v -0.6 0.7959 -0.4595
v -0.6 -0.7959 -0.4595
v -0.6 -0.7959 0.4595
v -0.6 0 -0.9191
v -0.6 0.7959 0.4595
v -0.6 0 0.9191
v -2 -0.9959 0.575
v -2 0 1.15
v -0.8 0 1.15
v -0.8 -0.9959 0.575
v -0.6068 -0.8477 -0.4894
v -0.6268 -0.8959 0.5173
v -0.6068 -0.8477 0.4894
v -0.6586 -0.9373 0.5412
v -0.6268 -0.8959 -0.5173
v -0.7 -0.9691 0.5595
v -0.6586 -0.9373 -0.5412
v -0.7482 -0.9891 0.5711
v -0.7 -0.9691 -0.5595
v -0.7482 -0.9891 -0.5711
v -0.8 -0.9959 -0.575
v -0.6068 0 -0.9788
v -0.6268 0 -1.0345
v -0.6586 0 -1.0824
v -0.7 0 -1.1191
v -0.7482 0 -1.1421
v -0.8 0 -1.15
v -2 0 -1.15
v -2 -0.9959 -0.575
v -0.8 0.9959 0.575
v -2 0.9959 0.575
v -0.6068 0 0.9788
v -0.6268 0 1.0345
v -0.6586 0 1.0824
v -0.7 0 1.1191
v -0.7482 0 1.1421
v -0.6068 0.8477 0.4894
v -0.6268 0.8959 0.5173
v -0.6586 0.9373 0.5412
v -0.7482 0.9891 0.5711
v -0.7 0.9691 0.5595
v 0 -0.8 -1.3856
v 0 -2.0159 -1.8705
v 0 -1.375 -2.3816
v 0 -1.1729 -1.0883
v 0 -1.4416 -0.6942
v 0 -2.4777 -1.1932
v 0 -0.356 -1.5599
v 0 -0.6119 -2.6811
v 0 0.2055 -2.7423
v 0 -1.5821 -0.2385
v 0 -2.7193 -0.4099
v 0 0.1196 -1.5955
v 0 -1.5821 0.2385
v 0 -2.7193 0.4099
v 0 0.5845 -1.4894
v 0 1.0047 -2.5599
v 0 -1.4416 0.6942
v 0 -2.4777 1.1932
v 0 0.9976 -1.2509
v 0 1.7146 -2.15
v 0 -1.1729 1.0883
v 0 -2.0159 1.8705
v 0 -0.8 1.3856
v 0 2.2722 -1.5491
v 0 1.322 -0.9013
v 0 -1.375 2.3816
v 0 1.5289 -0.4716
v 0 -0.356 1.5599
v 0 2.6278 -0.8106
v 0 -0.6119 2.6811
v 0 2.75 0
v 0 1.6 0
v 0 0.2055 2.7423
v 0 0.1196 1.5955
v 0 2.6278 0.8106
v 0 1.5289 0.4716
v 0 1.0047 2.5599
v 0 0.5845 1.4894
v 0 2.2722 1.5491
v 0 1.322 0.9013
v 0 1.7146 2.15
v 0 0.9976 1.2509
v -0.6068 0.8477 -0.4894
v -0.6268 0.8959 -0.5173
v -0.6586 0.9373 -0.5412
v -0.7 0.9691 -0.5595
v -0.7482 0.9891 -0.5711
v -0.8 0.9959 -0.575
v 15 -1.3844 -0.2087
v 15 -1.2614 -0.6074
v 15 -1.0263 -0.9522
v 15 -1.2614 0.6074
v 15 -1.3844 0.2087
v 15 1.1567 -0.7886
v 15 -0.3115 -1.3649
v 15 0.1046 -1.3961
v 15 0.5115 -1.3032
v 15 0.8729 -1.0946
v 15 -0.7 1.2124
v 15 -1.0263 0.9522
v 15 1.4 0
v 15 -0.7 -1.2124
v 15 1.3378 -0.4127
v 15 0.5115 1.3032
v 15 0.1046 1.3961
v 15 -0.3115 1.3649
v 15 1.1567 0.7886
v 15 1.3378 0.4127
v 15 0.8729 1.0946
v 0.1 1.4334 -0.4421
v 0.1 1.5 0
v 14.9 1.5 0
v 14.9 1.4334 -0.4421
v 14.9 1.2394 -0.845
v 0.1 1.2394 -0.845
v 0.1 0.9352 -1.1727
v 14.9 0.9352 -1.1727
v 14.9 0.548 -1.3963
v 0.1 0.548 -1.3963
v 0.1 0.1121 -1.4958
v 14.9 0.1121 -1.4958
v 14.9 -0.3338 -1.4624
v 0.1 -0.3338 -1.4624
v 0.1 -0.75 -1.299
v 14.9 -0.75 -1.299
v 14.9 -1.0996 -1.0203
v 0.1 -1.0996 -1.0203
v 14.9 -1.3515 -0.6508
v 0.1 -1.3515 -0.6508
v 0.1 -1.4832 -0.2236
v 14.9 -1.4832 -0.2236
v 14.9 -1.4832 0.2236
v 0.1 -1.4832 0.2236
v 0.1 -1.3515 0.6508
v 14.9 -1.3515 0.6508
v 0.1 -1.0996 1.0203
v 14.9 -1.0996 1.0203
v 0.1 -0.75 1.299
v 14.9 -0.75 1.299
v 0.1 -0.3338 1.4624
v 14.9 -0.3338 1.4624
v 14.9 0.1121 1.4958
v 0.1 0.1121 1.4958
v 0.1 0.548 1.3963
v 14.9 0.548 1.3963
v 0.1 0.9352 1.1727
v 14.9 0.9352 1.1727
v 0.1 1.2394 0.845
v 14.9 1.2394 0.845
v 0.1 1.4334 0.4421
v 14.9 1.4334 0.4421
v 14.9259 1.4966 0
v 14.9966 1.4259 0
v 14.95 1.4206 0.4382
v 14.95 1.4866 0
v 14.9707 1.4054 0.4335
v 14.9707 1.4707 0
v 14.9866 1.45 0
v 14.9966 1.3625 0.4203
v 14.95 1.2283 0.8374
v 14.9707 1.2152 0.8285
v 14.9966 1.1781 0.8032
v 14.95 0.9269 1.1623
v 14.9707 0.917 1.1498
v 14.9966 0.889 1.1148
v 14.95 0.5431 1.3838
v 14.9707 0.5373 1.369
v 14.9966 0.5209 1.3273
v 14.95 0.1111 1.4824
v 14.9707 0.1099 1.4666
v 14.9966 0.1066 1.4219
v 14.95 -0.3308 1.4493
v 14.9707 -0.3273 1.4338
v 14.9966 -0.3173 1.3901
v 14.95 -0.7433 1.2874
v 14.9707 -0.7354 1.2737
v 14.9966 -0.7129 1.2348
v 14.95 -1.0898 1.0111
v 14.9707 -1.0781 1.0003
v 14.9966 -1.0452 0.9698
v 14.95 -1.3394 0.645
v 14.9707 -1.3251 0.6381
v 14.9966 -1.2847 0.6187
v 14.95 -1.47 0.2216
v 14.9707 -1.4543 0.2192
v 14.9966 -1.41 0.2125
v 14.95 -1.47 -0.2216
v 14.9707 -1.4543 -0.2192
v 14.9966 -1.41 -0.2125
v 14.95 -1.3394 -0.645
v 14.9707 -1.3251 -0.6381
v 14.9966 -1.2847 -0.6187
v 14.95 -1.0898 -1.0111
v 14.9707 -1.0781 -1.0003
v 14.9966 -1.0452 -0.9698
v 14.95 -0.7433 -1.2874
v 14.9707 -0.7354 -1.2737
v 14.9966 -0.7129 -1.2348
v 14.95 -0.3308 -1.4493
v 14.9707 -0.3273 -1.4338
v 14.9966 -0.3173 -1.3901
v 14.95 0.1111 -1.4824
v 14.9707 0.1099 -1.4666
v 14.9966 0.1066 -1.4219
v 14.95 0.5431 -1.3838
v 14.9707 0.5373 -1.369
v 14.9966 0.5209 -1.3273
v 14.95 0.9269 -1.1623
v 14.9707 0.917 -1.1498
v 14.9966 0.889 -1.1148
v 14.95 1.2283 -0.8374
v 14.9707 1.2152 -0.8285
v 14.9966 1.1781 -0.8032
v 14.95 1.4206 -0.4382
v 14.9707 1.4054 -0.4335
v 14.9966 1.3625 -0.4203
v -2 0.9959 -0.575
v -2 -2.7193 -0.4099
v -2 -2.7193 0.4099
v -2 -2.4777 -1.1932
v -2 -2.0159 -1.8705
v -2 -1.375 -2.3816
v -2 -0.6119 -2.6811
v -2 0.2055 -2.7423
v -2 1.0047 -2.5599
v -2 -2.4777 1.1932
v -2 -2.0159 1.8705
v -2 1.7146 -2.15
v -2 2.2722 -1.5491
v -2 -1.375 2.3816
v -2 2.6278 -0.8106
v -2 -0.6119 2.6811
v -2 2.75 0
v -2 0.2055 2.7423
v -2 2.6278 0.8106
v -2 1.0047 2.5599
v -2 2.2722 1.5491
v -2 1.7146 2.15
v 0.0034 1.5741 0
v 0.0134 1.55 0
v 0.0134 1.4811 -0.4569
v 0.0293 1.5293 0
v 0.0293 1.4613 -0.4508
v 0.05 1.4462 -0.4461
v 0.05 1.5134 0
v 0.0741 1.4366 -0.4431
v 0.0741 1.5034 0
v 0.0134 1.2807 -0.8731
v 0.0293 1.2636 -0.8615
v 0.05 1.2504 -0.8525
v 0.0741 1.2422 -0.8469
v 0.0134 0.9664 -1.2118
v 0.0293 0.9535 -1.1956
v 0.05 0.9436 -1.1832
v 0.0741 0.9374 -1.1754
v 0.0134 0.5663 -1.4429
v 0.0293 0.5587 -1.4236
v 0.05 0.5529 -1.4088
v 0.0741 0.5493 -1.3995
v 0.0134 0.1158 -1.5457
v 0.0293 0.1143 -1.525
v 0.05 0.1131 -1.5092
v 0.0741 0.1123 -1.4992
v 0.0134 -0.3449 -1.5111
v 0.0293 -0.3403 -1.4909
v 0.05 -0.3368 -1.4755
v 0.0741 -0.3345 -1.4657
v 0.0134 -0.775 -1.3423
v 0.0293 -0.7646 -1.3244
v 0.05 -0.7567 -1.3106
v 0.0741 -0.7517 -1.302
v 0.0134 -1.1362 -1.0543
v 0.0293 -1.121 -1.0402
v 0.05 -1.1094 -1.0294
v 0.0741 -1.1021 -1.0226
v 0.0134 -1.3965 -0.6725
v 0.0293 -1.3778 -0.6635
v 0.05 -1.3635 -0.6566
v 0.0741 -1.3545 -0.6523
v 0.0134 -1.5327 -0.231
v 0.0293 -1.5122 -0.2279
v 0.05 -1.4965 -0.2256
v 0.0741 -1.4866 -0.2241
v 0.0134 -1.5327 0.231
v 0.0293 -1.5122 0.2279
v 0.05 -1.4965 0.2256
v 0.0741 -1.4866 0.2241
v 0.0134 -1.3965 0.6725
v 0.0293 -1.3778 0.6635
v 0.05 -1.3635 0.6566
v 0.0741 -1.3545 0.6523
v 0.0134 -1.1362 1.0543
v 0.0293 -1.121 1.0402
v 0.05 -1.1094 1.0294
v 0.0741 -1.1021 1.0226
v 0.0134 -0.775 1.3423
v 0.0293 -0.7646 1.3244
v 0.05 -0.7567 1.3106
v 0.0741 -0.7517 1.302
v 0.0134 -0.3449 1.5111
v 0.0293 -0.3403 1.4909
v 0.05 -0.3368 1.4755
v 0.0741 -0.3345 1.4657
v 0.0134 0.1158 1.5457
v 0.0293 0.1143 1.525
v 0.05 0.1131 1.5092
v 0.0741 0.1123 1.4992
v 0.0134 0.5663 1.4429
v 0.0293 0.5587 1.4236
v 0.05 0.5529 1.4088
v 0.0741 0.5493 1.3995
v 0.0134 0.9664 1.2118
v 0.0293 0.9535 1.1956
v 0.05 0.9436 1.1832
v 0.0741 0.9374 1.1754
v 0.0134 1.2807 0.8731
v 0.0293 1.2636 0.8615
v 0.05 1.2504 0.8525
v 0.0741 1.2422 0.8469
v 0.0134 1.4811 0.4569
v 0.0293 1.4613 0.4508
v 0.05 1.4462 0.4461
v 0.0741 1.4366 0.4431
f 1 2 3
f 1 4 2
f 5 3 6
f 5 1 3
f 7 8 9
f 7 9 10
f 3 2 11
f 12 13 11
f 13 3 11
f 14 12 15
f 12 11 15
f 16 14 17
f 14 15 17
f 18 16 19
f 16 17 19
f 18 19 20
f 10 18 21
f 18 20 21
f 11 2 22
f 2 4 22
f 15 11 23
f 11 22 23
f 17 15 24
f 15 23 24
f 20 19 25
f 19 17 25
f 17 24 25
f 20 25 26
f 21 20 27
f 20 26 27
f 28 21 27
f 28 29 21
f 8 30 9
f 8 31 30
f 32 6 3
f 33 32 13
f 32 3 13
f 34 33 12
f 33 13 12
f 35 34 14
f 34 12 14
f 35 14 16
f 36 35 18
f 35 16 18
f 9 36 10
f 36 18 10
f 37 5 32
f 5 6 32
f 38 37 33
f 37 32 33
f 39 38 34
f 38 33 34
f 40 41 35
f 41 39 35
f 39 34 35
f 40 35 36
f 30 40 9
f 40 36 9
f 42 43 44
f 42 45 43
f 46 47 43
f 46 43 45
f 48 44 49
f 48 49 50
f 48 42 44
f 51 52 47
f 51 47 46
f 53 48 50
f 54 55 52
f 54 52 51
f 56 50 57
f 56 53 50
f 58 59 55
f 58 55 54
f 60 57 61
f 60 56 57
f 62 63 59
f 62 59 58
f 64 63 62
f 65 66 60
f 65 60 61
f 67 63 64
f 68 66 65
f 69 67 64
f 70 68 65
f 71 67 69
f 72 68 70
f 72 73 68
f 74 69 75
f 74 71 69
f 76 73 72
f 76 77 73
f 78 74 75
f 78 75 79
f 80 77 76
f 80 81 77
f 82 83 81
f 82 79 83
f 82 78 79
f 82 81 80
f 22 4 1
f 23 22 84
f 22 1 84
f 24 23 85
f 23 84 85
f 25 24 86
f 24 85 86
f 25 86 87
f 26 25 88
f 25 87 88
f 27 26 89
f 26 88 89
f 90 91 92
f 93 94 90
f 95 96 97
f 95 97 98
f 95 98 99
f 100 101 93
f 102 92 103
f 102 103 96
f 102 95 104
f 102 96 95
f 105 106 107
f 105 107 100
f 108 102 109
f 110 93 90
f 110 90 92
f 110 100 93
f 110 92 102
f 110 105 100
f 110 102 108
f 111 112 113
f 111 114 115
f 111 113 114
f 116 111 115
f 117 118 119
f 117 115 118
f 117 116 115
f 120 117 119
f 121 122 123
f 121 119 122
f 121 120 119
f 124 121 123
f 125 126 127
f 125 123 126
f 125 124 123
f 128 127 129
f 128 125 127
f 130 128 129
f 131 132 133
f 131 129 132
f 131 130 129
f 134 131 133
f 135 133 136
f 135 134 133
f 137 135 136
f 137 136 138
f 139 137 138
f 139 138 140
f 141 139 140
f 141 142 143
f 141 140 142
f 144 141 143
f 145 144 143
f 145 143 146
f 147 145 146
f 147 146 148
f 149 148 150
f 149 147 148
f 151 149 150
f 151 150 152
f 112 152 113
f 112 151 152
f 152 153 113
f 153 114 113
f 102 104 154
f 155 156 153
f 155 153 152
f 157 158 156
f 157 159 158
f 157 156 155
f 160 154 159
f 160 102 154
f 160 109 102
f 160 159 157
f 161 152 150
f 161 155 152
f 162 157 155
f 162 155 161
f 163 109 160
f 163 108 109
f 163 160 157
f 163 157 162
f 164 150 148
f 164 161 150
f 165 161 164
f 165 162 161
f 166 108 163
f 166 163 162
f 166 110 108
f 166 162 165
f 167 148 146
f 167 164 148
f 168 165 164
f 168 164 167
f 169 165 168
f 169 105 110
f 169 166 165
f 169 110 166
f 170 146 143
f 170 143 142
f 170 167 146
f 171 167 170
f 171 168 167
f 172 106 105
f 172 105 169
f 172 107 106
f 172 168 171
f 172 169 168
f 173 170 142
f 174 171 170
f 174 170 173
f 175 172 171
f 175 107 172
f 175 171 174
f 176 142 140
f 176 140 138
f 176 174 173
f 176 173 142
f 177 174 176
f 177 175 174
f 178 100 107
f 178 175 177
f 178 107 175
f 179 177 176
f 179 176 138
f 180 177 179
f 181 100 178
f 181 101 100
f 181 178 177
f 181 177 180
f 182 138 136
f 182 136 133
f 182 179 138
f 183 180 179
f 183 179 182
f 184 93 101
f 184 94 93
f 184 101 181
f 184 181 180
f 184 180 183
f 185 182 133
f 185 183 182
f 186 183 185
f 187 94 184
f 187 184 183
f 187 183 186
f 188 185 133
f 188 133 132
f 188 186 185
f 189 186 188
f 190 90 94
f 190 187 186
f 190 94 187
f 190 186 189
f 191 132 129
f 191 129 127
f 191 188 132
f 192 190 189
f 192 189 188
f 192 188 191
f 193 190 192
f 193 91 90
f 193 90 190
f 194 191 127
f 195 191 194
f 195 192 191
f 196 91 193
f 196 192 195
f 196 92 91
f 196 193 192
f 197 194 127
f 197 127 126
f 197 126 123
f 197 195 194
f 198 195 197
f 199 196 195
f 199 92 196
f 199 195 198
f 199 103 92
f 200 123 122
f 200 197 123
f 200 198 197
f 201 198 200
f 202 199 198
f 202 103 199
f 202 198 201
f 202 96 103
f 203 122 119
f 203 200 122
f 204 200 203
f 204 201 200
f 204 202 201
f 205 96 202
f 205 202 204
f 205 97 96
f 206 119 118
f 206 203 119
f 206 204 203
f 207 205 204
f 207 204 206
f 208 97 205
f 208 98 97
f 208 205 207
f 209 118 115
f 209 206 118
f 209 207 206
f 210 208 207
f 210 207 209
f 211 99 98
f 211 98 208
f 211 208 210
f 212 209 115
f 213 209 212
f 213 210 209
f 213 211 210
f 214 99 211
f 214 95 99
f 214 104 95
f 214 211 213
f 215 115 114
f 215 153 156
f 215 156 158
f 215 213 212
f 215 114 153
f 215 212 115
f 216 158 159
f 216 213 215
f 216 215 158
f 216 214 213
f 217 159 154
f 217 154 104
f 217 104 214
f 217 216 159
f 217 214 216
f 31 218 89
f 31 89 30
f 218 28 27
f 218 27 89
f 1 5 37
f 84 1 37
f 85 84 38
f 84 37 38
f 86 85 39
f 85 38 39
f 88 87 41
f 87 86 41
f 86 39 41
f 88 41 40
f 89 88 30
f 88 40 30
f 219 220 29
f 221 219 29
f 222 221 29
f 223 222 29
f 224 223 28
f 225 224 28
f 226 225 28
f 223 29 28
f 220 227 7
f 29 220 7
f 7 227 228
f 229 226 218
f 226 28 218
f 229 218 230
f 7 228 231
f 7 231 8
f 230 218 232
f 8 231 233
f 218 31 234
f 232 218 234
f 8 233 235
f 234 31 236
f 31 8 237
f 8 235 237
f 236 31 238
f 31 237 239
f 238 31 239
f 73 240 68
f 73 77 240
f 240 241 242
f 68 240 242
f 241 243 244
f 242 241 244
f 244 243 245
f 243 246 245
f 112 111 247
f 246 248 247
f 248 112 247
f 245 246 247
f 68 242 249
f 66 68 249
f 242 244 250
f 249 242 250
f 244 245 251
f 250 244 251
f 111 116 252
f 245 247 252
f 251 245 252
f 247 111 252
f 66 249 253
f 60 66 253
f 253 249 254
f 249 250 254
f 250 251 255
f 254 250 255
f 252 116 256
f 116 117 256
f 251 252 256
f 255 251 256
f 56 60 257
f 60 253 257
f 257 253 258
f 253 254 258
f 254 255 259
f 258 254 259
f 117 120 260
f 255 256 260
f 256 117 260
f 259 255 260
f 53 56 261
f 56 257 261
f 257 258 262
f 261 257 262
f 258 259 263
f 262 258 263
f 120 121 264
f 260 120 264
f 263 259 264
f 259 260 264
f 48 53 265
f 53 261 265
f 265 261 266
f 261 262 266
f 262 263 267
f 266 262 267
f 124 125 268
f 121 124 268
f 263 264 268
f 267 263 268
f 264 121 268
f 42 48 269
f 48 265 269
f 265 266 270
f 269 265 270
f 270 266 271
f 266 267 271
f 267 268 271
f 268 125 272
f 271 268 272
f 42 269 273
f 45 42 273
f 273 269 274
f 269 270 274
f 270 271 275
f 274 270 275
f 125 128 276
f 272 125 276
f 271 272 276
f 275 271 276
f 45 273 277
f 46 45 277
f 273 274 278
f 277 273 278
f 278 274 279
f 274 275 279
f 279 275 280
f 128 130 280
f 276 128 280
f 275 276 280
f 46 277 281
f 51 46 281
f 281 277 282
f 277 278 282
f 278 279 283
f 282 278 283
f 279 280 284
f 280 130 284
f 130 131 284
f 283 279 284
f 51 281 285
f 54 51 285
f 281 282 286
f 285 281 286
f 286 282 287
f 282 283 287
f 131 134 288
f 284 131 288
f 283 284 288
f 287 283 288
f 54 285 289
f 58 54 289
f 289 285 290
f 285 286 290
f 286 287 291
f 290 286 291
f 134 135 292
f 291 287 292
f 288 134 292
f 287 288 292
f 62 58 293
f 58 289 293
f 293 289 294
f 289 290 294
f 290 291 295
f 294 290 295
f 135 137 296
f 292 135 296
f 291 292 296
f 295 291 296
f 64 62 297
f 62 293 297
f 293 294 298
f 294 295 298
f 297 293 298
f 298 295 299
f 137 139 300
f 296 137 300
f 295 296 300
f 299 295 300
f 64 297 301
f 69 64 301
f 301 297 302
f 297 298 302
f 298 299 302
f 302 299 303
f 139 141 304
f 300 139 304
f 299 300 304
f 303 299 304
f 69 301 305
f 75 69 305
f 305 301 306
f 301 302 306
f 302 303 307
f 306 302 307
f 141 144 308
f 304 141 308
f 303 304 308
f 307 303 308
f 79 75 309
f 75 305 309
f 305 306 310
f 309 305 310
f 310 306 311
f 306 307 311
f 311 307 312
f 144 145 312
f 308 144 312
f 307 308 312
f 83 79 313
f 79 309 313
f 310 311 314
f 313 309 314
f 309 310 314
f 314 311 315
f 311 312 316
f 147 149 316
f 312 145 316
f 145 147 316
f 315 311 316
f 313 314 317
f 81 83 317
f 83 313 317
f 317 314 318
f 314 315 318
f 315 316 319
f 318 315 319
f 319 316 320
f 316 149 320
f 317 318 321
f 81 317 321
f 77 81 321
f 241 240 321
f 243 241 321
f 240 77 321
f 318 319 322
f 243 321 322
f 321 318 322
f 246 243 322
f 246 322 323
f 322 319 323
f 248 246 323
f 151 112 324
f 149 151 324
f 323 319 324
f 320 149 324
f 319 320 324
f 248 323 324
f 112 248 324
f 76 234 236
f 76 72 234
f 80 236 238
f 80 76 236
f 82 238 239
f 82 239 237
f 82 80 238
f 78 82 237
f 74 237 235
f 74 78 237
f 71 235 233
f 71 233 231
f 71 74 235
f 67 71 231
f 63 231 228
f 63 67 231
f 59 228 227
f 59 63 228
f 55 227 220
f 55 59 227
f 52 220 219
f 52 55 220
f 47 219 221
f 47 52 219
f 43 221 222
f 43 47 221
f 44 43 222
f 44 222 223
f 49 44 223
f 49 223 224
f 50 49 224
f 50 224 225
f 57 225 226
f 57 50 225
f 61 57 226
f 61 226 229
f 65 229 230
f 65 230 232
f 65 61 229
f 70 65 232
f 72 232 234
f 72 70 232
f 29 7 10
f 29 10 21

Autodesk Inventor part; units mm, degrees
ref_plane "YZ Plane" through (0, 0, 0) normal (1, 0, 0) x (0, 1, 0)
ref_plane "XZ Plane" through (0, 0, 0) normal (0, 1, 0) x (-1, 0, 0)
ref_plane "XY Plane" through (0, 0, 0) normal (0, 0, 1) x (1, 0, 0)
sketch "スケッチ1" plane through (0, 0, 0) normal (0, 0, 1) x (1, 0, 0)
  line L0 (0, 0) -> (15, 0)
  line L1 (15, 0) -> (15, 1.5)
  line L2 (15, 1.5) -> (0, 1.5)
  line L3 (0, 1.5) -> (0, 0)
  line L4 (0, 0) -> (0, 2.75)
  line L5 (0, 0) -> (-2, 0)
  line L6 (-2, 0) -> (0, 0)
  line L7 (-2, 0) -> (-2, 1.15)
  line L8 (0, 0) -> (-2, 0)
  line L9 (-2, 0) -> (-2, 2.75)
  line L10 (-2, 2.75) -> (0, 2.75)
  line L11 (0, 2.75) -> (0, 0)
  dimension "d0" = 1.5
  dimension "d1" = 15
  dimension "d3" = 2
  dimension "d4" = 2.75
  dimension "d5" = 1.15
revolve "回転1" add sketch "スケッチ1" angle 360 about axis through (-2, 0, 0) along (1, 0, 0)
thread "ねじ1" size "M3x0.5" class "6g" standard "ANSI Metric M Profile" length 100
sketch "スケッチ2" plane through (-2, 0, 0) normal (-1, 0, 0) x (0, 0, 1)
  line L0 (-0.575, 0.9959) -> (0.575, 0.9959)
  line L1 (0.575, 0.9959) -> (1.15, 0)
  line L2 (1.15, 0) -> (0.575, -0.9959)
  line L3 (0.575, -0.9959) -> (-0.575, -0.9959)
  line L4 (-0.575, -0.9959) -> (-1.15, 0)
  line L5 (-1.15, 0) -> (-0.575, 0.9959)
  point P0 (0, 0)
  point P1 (0, 0)
  point P2 (0, 0)
  dimension "d10" = 1.15
  dimension "d11" = 1.9919
extrude "押し出し1" cut sketch "スケッチ2" against normal blind 1.4
fillet "フィレット1" radius 0.2 6 edges at (-0.6, 0.9959, 0) (-0.6, 0.498, 0.8625) (-0.6, 0.498, -0.8625) (-0.6, -0.498, -0.8625) (-0.6, -0.9959, 0) (-0.6, -0.498, 0.8625)
fillet "フィレット2" radius 0.1 1 edges at (0, -1.5, 0)
fillet "フィレット3" radius 0.1 1 edges at (15, -1.5, 0)
properties part number "ネジキャップM3L15" material "鋼"
